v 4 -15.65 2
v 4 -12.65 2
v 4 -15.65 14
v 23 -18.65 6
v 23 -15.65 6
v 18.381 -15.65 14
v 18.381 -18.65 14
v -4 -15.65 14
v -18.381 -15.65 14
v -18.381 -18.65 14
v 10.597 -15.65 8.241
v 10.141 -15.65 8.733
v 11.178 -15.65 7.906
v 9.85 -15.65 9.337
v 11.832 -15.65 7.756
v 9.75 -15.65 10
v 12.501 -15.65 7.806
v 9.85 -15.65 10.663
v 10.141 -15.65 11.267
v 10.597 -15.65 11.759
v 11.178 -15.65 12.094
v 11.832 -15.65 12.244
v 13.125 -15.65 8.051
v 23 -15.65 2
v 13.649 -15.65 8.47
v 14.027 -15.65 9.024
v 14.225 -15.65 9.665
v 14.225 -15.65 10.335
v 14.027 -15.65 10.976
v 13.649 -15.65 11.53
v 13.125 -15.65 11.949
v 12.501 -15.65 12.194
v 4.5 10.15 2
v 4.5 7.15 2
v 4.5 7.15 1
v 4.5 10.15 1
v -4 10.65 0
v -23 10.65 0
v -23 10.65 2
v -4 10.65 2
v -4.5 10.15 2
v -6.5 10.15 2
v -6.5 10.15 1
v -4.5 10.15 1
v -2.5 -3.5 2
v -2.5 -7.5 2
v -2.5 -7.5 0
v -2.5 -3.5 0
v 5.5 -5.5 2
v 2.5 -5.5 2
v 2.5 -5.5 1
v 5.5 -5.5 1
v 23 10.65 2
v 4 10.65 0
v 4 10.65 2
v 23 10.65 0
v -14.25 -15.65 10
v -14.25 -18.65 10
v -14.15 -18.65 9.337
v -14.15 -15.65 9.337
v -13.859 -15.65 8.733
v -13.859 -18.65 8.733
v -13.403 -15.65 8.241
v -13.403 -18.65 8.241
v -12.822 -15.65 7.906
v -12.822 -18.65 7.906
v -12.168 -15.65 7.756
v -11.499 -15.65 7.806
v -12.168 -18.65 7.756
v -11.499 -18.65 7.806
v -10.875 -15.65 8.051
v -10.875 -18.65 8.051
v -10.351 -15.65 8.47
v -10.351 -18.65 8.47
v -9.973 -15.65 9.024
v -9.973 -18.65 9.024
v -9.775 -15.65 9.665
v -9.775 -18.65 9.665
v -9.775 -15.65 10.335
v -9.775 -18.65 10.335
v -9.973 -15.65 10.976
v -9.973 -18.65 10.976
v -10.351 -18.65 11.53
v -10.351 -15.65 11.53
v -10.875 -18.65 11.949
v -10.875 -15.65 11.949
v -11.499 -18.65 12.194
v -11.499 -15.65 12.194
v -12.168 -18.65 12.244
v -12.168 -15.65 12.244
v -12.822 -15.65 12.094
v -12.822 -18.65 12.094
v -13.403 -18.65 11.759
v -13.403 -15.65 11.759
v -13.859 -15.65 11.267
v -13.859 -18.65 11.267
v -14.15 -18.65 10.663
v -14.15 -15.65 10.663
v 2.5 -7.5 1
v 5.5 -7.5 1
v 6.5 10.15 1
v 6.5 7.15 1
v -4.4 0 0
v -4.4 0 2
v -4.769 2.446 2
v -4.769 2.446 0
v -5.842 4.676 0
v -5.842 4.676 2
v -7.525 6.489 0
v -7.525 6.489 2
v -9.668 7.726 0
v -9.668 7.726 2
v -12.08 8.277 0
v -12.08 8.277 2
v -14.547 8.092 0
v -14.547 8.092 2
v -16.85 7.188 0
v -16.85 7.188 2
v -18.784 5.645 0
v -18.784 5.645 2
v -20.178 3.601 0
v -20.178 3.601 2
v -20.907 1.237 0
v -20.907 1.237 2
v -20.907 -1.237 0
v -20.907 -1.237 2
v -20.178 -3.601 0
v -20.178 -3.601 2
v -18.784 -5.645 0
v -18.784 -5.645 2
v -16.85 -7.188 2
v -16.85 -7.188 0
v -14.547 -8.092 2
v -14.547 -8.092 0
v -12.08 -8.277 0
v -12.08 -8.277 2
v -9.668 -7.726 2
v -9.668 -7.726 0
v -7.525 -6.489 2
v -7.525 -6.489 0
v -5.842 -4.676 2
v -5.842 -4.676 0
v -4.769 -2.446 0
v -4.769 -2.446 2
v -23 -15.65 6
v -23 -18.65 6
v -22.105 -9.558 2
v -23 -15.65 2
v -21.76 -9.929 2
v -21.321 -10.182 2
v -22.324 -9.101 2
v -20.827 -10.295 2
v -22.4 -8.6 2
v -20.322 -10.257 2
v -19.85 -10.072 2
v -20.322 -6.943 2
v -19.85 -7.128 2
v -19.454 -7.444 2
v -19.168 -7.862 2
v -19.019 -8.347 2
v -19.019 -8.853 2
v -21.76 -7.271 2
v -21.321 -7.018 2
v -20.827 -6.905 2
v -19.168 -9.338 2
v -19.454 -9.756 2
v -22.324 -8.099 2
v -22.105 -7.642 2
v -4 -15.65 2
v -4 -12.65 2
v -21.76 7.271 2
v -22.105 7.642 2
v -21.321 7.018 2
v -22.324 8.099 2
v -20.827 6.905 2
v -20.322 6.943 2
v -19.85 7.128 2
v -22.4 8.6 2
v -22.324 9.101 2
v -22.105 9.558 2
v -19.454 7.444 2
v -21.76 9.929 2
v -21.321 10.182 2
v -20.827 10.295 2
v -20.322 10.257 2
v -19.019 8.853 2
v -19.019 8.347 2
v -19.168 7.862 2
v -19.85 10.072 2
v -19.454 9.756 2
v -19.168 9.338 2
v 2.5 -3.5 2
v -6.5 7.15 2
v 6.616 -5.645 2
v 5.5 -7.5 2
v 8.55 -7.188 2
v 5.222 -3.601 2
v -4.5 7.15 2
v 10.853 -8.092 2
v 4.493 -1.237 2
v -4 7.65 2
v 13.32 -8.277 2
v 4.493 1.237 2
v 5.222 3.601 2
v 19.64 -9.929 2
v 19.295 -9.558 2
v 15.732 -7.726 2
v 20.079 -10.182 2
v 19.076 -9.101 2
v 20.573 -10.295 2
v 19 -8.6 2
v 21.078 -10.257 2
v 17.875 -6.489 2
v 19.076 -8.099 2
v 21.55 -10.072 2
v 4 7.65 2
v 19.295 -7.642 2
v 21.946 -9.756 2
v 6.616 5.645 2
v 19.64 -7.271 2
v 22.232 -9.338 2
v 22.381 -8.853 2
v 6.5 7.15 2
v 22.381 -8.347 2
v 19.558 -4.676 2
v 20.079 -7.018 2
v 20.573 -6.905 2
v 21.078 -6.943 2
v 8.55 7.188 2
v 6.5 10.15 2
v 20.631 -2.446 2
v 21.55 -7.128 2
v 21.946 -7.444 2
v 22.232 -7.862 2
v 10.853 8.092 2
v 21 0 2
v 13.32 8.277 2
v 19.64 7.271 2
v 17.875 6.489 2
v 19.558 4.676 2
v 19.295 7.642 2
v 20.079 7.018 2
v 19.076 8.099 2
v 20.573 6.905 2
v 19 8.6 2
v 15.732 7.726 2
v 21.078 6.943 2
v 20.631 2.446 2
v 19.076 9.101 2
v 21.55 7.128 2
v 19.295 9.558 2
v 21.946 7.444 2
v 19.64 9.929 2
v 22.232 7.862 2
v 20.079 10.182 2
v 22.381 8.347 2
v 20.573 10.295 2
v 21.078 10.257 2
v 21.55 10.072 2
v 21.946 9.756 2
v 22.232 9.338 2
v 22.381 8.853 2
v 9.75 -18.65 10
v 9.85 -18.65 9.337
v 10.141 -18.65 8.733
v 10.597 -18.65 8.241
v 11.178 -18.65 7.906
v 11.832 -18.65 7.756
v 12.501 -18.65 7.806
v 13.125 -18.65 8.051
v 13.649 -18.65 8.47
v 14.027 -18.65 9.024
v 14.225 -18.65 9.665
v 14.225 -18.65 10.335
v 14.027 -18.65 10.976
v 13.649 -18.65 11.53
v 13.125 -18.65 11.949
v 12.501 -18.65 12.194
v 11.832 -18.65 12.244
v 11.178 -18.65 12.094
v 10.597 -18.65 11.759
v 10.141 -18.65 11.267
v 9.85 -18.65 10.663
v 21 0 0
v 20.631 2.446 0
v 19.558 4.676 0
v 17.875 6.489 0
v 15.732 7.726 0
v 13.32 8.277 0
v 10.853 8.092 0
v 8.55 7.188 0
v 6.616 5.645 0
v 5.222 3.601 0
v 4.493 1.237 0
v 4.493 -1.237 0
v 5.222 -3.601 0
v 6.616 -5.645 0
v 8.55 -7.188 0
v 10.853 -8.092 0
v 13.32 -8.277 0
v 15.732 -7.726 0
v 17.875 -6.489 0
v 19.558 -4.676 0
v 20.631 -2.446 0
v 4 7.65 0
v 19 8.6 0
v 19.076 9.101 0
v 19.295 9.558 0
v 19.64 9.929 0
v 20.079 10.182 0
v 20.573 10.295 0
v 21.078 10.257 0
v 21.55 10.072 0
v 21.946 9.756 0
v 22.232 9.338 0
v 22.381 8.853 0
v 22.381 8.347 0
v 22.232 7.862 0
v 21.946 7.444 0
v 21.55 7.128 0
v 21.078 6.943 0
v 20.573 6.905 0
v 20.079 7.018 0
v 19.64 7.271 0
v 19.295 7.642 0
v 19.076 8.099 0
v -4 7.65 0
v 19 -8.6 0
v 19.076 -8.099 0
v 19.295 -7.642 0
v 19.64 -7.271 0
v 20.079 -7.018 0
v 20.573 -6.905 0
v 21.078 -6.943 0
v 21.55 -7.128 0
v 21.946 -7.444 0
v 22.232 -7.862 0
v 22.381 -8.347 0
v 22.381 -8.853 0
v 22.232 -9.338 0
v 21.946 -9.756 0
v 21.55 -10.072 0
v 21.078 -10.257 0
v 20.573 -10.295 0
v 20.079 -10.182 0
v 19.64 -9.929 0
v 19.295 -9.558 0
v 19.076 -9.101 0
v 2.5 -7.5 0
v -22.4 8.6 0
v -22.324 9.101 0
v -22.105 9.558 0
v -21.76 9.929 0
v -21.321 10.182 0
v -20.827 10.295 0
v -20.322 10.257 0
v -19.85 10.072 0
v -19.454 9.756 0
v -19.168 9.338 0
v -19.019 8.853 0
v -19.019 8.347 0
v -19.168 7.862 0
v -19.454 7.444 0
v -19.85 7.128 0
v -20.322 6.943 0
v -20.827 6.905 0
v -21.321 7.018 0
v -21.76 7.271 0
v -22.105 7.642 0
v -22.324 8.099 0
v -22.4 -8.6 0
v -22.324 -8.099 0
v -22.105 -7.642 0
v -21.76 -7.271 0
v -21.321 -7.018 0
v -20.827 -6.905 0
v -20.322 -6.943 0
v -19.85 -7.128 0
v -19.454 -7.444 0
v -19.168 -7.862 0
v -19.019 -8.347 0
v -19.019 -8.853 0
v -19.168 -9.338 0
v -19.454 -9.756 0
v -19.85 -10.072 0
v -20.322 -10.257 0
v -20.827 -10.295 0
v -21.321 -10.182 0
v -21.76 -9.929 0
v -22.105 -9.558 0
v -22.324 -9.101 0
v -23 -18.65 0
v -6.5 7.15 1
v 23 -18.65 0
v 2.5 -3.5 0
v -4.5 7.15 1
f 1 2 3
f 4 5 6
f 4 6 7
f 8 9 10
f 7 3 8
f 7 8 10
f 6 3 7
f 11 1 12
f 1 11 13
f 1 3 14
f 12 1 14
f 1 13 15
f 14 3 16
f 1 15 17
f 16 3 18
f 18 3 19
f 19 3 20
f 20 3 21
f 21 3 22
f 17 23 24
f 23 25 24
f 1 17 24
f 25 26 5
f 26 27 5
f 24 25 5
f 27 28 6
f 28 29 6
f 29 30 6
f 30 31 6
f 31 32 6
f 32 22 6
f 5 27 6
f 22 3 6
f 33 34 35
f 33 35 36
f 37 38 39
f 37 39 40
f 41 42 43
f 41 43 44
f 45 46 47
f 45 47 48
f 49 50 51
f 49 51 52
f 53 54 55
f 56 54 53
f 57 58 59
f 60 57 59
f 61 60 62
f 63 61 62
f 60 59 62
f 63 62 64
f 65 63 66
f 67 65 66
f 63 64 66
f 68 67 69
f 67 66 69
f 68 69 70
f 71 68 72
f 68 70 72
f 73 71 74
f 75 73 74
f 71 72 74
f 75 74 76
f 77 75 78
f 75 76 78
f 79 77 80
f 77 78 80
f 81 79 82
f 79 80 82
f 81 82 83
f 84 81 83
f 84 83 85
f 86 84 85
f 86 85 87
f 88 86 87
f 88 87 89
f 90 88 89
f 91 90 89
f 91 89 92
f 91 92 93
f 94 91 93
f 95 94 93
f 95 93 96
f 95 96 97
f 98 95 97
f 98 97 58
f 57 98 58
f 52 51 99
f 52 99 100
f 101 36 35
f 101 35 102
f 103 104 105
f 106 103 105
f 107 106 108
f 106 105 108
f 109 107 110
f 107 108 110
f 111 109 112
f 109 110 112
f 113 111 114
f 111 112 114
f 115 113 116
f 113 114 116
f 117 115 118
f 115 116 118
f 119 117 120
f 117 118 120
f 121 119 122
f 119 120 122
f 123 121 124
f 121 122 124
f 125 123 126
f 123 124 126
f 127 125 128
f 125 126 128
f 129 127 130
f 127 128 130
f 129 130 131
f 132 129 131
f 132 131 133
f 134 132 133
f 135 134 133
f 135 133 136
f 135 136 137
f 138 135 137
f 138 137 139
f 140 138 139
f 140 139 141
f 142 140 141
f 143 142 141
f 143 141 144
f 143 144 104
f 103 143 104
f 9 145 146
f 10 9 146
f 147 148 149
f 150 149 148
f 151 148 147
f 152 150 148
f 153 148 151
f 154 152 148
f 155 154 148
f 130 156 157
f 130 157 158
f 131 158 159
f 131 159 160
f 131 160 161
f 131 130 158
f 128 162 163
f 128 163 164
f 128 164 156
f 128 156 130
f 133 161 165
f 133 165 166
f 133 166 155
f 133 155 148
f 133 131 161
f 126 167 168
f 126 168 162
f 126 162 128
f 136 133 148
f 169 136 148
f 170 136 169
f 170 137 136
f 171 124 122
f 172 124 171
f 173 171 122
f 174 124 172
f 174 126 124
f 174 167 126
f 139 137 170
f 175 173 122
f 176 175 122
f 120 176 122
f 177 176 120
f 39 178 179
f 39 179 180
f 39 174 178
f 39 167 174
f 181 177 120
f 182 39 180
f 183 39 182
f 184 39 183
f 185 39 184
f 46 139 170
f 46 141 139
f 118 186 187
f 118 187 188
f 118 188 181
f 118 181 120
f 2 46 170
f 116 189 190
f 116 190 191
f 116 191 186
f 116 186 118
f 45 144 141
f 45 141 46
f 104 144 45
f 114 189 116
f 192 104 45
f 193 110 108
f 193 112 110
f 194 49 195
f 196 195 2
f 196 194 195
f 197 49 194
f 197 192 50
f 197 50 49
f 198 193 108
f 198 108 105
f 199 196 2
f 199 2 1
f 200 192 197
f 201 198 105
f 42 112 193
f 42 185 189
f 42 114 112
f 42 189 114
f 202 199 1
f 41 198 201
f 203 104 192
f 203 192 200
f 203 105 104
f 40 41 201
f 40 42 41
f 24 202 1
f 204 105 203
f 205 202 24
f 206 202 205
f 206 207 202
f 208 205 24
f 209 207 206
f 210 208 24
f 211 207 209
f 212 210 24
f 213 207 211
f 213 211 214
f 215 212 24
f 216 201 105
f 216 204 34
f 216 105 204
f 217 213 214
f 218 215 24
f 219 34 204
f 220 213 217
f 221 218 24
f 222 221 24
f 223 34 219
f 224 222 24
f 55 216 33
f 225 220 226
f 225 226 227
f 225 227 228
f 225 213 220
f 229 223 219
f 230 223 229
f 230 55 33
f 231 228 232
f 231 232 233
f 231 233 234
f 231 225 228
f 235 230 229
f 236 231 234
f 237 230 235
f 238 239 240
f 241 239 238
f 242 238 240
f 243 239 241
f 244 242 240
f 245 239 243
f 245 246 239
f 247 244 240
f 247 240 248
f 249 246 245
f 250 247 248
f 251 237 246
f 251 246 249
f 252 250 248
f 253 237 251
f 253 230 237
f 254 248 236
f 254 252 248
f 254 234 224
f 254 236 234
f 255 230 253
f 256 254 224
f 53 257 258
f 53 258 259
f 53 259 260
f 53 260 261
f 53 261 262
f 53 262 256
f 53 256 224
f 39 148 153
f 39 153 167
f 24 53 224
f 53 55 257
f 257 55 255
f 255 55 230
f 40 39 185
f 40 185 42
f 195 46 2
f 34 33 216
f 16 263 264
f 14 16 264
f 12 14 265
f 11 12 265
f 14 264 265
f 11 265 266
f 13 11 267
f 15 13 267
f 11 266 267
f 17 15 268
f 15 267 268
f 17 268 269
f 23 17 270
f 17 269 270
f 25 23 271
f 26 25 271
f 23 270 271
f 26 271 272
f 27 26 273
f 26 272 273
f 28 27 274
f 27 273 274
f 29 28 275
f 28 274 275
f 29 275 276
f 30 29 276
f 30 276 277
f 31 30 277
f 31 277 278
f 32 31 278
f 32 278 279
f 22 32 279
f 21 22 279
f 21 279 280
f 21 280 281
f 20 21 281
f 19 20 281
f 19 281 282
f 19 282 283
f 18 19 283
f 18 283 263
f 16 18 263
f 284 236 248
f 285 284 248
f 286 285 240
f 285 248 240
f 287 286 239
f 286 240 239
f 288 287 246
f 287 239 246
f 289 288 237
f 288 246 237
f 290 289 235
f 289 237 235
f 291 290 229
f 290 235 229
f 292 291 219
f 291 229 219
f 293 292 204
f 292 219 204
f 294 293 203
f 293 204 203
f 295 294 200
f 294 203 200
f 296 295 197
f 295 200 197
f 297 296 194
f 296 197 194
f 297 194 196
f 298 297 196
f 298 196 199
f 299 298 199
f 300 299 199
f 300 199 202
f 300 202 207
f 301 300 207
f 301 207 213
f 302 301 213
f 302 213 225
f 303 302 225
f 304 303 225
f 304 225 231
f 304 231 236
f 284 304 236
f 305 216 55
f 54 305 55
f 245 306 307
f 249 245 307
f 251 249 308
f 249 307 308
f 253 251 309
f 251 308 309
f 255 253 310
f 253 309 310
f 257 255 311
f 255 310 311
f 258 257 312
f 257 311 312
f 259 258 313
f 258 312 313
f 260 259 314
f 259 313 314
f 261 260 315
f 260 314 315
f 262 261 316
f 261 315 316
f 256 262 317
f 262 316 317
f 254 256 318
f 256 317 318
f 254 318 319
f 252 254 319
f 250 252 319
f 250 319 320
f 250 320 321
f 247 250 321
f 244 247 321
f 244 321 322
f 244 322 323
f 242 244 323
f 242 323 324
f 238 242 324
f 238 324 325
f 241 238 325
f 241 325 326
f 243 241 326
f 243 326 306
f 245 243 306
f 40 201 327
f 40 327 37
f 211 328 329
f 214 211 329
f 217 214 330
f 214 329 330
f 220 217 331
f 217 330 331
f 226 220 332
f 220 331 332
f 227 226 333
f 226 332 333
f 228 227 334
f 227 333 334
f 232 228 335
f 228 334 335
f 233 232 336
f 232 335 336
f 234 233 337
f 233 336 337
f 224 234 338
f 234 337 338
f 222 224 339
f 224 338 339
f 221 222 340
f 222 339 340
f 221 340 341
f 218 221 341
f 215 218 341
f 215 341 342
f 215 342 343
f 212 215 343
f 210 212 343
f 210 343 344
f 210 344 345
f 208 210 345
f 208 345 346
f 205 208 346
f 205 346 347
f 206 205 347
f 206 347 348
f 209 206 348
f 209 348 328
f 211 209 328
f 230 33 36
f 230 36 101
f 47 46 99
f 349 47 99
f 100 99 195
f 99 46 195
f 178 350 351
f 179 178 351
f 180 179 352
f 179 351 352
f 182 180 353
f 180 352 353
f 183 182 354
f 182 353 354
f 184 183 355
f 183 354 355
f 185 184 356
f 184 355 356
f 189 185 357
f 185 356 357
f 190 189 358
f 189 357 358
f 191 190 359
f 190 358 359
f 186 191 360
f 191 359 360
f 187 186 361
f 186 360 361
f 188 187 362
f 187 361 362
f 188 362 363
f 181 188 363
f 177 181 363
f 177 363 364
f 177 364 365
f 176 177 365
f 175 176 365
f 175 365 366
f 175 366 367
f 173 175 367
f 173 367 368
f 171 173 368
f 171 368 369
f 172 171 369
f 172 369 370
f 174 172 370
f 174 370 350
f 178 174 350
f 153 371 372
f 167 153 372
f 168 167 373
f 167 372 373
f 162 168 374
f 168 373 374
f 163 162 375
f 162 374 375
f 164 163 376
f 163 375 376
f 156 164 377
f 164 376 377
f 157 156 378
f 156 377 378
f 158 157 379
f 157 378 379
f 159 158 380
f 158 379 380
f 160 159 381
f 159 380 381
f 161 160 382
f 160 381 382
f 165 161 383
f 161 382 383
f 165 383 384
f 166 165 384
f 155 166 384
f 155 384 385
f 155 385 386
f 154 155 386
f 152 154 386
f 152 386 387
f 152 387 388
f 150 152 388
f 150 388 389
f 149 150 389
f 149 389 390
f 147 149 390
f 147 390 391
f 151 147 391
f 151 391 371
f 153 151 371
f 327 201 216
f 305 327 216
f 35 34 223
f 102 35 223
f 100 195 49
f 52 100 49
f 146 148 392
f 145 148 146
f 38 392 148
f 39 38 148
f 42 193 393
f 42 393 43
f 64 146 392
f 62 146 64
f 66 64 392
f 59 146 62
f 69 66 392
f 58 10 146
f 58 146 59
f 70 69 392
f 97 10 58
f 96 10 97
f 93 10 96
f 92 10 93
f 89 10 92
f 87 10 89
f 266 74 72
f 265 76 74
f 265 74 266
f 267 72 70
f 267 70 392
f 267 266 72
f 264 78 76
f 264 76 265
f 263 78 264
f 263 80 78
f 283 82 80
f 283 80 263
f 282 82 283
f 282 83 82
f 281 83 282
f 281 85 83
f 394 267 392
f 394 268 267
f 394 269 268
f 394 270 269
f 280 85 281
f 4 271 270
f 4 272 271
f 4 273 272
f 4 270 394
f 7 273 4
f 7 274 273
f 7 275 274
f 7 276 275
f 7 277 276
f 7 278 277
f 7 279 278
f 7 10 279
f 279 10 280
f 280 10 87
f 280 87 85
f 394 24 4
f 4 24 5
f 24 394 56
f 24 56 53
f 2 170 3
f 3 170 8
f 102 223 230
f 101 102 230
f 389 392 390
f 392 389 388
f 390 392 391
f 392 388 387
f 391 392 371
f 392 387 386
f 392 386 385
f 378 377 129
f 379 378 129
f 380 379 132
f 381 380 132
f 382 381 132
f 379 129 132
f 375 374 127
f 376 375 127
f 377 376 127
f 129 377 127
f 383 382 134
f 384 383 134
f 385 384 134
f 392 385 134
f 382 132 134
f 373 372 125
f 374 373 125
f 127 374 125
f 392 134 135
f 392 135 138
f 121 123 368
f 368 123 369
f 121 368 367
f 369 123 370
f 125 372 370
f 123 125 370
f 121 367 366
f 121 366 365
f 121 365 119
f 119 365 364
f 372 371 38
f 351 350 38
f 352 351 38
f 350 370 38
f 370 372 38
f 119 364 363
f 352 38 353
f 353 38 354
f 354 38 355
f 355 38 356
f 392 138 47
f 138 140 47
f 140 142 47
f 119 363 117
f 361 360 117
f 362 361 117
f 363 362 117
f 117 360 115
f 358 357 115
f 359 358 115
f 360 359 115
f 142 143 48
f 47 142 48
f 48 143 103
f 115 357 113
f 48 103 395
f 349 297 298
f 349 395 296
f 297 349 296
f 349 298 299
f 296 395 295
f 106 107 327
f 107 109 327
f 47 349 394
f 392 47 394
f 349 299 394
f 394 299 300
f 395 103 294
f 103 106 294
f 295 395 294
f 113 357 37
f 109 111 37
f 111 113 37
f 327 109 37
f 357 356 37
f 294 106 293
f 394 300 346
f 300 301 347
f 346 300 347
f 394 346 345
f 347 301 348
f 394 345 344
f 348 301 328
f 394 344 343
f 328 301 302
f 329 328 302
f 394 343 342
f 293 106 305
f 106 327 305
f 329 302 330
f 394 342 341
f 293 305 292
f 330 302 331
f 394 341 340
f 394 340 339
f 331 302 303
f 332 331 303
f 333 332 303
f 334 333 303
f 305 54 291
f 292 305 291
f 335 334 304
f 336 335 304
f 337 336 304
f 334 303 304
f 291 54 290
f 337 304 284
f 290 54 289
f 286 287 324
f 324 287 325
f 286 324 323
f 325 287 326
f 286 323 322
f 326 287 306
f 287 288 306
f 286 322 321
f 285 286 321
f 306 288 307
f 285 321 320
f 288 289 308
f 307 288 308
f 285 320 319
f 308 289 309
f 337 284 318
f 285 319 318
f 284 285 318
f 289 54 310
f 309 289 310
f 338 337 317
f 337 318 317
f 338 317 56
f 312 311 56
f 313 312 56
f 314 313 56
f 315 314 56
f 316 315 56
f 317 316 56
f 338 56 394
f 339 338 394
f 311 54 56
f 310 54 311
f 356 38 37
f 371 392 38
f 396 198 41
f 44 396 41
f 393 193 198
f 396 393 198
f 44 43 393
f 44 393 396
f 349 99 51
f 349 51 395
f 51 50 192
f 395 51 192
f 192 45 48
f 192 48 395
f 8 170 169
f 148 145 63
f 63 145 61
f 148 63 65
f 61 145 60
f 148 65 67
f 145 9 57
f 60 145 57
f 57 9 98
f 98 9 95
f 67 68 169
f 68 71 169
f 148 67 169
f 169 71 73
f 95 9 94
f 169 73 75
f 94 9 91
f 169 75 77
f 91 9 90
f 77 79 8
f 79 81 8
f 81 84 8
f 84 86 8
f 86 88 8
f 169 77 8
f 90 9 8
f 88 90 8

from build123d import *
from OCP.BRepFilletAPI import BRepFilletAPI_MakeChamfer

# Parameters (mm, degrees)
SKETCH_1_W          = 46
SKETCH_1_H          = 21.3
EXTRUDE_1_DEPTH     = 2
SKETCH_2_R          = 8.3
CUT_EXTRUDE_1_DEPTH = 26.424840216
SKETCH_3_W          = 8
SKETCH_3_H          = 3
CUT_EXTRUDE_2_DEPTH = 26.424840216
SKETCH_4_W          = 5
SKETCH_4_H          = 4
CUT_EXTRUDE_3_DEPTH = 26.424840216
SKETCH_5_W          = 3
SKETCH_5_H          = 2
SKETCH_5_W_2        = 2
SKETCH_5_H_2        = 3
CUT_EXTRUDE_4_DEPTH = 1
SKETCH_8_W          = 46
SKETCH_8_H          = 2
EXTRUDE_2_DEPTH     = 5
SKETCH_9_W          = 46
SKETCH_9_H          = 14
EXTRUDE_3_DEPTH     = 3
HOLE_WIZARD_M3_1_D  = 3.4
HOLE_WIZARD_M4_1_D  = 4.5
RIB_1_REACH         = 34.754
SKETCH_13_WALL_W    = 79.877255328
SKETCH_13_WALL_H    = 8
CHAMFER_1_SIZE      = 8
CHAMFER_1_SIZE2     = 4.618802154


with BuildPart() as part:
    # 草圖1 → 填料-伸長1 (new body)
    with BuildSketch(Plane.XY):
        Rectangle(SKETCH_1_W, SKETCH_1_H)
    extrude(amount=EXTRUDE_1_DEPTH)

    # 草圖2 → 除料-伸長1 (cut, through all)
    with BuildSketch(Plane.XY.offset(2)):
        with Locations((-12.7, 0)):
            Circle(SKETCH_2_R)
        with Locations((12.7, 0)):
            Circle(SKETCH_2_R)
    extrude(amount=-CUT_EXTRUDE_1_DEPTH, mode=Mode.SUBTRACT)

    # 草圖3 → 除料-伸長2 (cut, through all)
    with BuildSketch(Plane.XY.offset(2)):
        with Locations((0, 9.15)):
            Rectangle(SKETCH_3_W, SKETCH_3_H)
    extrude(amount=-CUT_EXTRUDE_2_DEPTH, mode=Mode.SUBTRACT)

    # 草圖4 → 除料-伸長3 (cut, through all)
    with BuildSketch(Plane.XY.offset(2)):
        with Locations((0, -5.5)):
            Rectangle(SKETCH_4_W, SKETCH_4_H)
    extrude(amount=-CUT_EXTRUDE_3_DEPTH, mode=Mode.SUBTRACT)

    # 草圖5 → 除料-伸長4 (cut)
    with BuildSketch(Plane.XY.offset(2)):
        with Locations((4, -6.5)):
            Rectangle(SKETCH_5_W, SKETCH_5_H)
        with Locations((-5.5, 8.65)):
            Rectangle(SKETCH_5_W_2, SKETCH_5_H_2)
        with Locations((5.5, 8.65)):
            Rectangle(SKETCH_5_W_2, SKETCH_5_H_2)
    extrude(amount=-CUT_EXTRUDE_4_DEPTH, mode=Mode.SUBTRACT)

    # 草圖8 → 填料-伸長2 (add)
    with BuildSketch(Plane.XZ.offset(10.65)):
        with Locations((0, 1)):
            Rectangle(SKETCH_8_W, SKETCH_8_H)
    extrude(amount=EXTRUDE_2_DEPTH)

    # 草圖9 → 填料-伸長3 (add)
    with BuildSketch(Plane.XZ.offset(15.65)):
        with Locations((0, 7)):
            Rectangle(SKETCH_9_W, SKETCH_9_H)
    extrude(amount=EXTRUDE_3_DEPTH)

    # M3 餘隙孔1 (through all)
    with Locations(Plane.XY.offset(2)):
        with Locations((20.7, 8.6), (-20.7, -8.6), (-20.7, 8.6), (20.7, -8.6)):
            Hole(HOLE_WIZARD_M3_1_D / 2)

    # M4 餘隙孔1 (through all)
    with Locations(Plane(origin=(0, -15.65, 0), x_dir=(1, 0, 0), z_dir=(0, 1, 0))):
        with Locations((12, -10), (-12, -10)):
            Hole(HOLE_WIZARD_M4_1_D / 2)

    # 草圖13 wall → 肋材1 (add, up to next)
    with BuildSketch(Plane(origin=(0, -14.15, 8), x_dir=(0, -0.242535625036, 0.970142500145), z_dir=(0, -0.970142500145, -0.242535625036)), mode=Mode.PRIVATE) as rib_1_sk1:
        Rectangle(SKETCH_13_WALL_W, SKETCH_13_WALL_H)
    rib_1_tool1 = extrude(rib_1_sk1.sketch, amount=RIB_1_REACH, mode=Mode.PRIVATE) - part.part
    add(rib_1_tool1.solids().sort_by_distance((0, -14.15, 8))[0])

    # 導角1: one chamfer whose edges measure the first distance from different faces: ONE call of the kernel's chamfer builder (chamfer() names one face for all edges)
    chamfer_1_edges_1 = [part.edges().sort_by_distance(p)[0] for p in [
        (-23, -17.15, 14),
    ]]
    chamfer_1_side_1 = [part.faces().sort_by_distance(p)[0] for p in [
        (-23, 10.325270882, 1),
    ]]
    chamfer_1_edges_2 = [part.edges().sort_by_distance(p)[0] for p in [
        (23, -17.15, 14),
    ]]
    chamfer_1_side_2 = [part.faces().sort_by_distance(p)[0] for p in [
        (23, 10.325270882, 1),
    ]]
    chamfer_1 = BRepFilletAPI_MakeChamfer(part.part.solid().wrapped)
    for e in chamfer_1_edges_1:
        chamfer_1.Add(CHAMFER_1_SIZE, CHAMFER_1_SIZE2, e.wrapped, chamfer_1_side_1[0].wrapped)  # the first distance lies on this face
    for e in chamfer_1_edges_2:
        chamfer_1.Add(CHAMFER_1_SIZE, CHAMFER_1_SIZE2, e.wrapped, chamfer_1_side_2[0].wrapped)  # the first distance lies on this face
    add(Compound.cast(chamfer_1.Shape()), mode=Mode.REPLACE)


solid = part.part
